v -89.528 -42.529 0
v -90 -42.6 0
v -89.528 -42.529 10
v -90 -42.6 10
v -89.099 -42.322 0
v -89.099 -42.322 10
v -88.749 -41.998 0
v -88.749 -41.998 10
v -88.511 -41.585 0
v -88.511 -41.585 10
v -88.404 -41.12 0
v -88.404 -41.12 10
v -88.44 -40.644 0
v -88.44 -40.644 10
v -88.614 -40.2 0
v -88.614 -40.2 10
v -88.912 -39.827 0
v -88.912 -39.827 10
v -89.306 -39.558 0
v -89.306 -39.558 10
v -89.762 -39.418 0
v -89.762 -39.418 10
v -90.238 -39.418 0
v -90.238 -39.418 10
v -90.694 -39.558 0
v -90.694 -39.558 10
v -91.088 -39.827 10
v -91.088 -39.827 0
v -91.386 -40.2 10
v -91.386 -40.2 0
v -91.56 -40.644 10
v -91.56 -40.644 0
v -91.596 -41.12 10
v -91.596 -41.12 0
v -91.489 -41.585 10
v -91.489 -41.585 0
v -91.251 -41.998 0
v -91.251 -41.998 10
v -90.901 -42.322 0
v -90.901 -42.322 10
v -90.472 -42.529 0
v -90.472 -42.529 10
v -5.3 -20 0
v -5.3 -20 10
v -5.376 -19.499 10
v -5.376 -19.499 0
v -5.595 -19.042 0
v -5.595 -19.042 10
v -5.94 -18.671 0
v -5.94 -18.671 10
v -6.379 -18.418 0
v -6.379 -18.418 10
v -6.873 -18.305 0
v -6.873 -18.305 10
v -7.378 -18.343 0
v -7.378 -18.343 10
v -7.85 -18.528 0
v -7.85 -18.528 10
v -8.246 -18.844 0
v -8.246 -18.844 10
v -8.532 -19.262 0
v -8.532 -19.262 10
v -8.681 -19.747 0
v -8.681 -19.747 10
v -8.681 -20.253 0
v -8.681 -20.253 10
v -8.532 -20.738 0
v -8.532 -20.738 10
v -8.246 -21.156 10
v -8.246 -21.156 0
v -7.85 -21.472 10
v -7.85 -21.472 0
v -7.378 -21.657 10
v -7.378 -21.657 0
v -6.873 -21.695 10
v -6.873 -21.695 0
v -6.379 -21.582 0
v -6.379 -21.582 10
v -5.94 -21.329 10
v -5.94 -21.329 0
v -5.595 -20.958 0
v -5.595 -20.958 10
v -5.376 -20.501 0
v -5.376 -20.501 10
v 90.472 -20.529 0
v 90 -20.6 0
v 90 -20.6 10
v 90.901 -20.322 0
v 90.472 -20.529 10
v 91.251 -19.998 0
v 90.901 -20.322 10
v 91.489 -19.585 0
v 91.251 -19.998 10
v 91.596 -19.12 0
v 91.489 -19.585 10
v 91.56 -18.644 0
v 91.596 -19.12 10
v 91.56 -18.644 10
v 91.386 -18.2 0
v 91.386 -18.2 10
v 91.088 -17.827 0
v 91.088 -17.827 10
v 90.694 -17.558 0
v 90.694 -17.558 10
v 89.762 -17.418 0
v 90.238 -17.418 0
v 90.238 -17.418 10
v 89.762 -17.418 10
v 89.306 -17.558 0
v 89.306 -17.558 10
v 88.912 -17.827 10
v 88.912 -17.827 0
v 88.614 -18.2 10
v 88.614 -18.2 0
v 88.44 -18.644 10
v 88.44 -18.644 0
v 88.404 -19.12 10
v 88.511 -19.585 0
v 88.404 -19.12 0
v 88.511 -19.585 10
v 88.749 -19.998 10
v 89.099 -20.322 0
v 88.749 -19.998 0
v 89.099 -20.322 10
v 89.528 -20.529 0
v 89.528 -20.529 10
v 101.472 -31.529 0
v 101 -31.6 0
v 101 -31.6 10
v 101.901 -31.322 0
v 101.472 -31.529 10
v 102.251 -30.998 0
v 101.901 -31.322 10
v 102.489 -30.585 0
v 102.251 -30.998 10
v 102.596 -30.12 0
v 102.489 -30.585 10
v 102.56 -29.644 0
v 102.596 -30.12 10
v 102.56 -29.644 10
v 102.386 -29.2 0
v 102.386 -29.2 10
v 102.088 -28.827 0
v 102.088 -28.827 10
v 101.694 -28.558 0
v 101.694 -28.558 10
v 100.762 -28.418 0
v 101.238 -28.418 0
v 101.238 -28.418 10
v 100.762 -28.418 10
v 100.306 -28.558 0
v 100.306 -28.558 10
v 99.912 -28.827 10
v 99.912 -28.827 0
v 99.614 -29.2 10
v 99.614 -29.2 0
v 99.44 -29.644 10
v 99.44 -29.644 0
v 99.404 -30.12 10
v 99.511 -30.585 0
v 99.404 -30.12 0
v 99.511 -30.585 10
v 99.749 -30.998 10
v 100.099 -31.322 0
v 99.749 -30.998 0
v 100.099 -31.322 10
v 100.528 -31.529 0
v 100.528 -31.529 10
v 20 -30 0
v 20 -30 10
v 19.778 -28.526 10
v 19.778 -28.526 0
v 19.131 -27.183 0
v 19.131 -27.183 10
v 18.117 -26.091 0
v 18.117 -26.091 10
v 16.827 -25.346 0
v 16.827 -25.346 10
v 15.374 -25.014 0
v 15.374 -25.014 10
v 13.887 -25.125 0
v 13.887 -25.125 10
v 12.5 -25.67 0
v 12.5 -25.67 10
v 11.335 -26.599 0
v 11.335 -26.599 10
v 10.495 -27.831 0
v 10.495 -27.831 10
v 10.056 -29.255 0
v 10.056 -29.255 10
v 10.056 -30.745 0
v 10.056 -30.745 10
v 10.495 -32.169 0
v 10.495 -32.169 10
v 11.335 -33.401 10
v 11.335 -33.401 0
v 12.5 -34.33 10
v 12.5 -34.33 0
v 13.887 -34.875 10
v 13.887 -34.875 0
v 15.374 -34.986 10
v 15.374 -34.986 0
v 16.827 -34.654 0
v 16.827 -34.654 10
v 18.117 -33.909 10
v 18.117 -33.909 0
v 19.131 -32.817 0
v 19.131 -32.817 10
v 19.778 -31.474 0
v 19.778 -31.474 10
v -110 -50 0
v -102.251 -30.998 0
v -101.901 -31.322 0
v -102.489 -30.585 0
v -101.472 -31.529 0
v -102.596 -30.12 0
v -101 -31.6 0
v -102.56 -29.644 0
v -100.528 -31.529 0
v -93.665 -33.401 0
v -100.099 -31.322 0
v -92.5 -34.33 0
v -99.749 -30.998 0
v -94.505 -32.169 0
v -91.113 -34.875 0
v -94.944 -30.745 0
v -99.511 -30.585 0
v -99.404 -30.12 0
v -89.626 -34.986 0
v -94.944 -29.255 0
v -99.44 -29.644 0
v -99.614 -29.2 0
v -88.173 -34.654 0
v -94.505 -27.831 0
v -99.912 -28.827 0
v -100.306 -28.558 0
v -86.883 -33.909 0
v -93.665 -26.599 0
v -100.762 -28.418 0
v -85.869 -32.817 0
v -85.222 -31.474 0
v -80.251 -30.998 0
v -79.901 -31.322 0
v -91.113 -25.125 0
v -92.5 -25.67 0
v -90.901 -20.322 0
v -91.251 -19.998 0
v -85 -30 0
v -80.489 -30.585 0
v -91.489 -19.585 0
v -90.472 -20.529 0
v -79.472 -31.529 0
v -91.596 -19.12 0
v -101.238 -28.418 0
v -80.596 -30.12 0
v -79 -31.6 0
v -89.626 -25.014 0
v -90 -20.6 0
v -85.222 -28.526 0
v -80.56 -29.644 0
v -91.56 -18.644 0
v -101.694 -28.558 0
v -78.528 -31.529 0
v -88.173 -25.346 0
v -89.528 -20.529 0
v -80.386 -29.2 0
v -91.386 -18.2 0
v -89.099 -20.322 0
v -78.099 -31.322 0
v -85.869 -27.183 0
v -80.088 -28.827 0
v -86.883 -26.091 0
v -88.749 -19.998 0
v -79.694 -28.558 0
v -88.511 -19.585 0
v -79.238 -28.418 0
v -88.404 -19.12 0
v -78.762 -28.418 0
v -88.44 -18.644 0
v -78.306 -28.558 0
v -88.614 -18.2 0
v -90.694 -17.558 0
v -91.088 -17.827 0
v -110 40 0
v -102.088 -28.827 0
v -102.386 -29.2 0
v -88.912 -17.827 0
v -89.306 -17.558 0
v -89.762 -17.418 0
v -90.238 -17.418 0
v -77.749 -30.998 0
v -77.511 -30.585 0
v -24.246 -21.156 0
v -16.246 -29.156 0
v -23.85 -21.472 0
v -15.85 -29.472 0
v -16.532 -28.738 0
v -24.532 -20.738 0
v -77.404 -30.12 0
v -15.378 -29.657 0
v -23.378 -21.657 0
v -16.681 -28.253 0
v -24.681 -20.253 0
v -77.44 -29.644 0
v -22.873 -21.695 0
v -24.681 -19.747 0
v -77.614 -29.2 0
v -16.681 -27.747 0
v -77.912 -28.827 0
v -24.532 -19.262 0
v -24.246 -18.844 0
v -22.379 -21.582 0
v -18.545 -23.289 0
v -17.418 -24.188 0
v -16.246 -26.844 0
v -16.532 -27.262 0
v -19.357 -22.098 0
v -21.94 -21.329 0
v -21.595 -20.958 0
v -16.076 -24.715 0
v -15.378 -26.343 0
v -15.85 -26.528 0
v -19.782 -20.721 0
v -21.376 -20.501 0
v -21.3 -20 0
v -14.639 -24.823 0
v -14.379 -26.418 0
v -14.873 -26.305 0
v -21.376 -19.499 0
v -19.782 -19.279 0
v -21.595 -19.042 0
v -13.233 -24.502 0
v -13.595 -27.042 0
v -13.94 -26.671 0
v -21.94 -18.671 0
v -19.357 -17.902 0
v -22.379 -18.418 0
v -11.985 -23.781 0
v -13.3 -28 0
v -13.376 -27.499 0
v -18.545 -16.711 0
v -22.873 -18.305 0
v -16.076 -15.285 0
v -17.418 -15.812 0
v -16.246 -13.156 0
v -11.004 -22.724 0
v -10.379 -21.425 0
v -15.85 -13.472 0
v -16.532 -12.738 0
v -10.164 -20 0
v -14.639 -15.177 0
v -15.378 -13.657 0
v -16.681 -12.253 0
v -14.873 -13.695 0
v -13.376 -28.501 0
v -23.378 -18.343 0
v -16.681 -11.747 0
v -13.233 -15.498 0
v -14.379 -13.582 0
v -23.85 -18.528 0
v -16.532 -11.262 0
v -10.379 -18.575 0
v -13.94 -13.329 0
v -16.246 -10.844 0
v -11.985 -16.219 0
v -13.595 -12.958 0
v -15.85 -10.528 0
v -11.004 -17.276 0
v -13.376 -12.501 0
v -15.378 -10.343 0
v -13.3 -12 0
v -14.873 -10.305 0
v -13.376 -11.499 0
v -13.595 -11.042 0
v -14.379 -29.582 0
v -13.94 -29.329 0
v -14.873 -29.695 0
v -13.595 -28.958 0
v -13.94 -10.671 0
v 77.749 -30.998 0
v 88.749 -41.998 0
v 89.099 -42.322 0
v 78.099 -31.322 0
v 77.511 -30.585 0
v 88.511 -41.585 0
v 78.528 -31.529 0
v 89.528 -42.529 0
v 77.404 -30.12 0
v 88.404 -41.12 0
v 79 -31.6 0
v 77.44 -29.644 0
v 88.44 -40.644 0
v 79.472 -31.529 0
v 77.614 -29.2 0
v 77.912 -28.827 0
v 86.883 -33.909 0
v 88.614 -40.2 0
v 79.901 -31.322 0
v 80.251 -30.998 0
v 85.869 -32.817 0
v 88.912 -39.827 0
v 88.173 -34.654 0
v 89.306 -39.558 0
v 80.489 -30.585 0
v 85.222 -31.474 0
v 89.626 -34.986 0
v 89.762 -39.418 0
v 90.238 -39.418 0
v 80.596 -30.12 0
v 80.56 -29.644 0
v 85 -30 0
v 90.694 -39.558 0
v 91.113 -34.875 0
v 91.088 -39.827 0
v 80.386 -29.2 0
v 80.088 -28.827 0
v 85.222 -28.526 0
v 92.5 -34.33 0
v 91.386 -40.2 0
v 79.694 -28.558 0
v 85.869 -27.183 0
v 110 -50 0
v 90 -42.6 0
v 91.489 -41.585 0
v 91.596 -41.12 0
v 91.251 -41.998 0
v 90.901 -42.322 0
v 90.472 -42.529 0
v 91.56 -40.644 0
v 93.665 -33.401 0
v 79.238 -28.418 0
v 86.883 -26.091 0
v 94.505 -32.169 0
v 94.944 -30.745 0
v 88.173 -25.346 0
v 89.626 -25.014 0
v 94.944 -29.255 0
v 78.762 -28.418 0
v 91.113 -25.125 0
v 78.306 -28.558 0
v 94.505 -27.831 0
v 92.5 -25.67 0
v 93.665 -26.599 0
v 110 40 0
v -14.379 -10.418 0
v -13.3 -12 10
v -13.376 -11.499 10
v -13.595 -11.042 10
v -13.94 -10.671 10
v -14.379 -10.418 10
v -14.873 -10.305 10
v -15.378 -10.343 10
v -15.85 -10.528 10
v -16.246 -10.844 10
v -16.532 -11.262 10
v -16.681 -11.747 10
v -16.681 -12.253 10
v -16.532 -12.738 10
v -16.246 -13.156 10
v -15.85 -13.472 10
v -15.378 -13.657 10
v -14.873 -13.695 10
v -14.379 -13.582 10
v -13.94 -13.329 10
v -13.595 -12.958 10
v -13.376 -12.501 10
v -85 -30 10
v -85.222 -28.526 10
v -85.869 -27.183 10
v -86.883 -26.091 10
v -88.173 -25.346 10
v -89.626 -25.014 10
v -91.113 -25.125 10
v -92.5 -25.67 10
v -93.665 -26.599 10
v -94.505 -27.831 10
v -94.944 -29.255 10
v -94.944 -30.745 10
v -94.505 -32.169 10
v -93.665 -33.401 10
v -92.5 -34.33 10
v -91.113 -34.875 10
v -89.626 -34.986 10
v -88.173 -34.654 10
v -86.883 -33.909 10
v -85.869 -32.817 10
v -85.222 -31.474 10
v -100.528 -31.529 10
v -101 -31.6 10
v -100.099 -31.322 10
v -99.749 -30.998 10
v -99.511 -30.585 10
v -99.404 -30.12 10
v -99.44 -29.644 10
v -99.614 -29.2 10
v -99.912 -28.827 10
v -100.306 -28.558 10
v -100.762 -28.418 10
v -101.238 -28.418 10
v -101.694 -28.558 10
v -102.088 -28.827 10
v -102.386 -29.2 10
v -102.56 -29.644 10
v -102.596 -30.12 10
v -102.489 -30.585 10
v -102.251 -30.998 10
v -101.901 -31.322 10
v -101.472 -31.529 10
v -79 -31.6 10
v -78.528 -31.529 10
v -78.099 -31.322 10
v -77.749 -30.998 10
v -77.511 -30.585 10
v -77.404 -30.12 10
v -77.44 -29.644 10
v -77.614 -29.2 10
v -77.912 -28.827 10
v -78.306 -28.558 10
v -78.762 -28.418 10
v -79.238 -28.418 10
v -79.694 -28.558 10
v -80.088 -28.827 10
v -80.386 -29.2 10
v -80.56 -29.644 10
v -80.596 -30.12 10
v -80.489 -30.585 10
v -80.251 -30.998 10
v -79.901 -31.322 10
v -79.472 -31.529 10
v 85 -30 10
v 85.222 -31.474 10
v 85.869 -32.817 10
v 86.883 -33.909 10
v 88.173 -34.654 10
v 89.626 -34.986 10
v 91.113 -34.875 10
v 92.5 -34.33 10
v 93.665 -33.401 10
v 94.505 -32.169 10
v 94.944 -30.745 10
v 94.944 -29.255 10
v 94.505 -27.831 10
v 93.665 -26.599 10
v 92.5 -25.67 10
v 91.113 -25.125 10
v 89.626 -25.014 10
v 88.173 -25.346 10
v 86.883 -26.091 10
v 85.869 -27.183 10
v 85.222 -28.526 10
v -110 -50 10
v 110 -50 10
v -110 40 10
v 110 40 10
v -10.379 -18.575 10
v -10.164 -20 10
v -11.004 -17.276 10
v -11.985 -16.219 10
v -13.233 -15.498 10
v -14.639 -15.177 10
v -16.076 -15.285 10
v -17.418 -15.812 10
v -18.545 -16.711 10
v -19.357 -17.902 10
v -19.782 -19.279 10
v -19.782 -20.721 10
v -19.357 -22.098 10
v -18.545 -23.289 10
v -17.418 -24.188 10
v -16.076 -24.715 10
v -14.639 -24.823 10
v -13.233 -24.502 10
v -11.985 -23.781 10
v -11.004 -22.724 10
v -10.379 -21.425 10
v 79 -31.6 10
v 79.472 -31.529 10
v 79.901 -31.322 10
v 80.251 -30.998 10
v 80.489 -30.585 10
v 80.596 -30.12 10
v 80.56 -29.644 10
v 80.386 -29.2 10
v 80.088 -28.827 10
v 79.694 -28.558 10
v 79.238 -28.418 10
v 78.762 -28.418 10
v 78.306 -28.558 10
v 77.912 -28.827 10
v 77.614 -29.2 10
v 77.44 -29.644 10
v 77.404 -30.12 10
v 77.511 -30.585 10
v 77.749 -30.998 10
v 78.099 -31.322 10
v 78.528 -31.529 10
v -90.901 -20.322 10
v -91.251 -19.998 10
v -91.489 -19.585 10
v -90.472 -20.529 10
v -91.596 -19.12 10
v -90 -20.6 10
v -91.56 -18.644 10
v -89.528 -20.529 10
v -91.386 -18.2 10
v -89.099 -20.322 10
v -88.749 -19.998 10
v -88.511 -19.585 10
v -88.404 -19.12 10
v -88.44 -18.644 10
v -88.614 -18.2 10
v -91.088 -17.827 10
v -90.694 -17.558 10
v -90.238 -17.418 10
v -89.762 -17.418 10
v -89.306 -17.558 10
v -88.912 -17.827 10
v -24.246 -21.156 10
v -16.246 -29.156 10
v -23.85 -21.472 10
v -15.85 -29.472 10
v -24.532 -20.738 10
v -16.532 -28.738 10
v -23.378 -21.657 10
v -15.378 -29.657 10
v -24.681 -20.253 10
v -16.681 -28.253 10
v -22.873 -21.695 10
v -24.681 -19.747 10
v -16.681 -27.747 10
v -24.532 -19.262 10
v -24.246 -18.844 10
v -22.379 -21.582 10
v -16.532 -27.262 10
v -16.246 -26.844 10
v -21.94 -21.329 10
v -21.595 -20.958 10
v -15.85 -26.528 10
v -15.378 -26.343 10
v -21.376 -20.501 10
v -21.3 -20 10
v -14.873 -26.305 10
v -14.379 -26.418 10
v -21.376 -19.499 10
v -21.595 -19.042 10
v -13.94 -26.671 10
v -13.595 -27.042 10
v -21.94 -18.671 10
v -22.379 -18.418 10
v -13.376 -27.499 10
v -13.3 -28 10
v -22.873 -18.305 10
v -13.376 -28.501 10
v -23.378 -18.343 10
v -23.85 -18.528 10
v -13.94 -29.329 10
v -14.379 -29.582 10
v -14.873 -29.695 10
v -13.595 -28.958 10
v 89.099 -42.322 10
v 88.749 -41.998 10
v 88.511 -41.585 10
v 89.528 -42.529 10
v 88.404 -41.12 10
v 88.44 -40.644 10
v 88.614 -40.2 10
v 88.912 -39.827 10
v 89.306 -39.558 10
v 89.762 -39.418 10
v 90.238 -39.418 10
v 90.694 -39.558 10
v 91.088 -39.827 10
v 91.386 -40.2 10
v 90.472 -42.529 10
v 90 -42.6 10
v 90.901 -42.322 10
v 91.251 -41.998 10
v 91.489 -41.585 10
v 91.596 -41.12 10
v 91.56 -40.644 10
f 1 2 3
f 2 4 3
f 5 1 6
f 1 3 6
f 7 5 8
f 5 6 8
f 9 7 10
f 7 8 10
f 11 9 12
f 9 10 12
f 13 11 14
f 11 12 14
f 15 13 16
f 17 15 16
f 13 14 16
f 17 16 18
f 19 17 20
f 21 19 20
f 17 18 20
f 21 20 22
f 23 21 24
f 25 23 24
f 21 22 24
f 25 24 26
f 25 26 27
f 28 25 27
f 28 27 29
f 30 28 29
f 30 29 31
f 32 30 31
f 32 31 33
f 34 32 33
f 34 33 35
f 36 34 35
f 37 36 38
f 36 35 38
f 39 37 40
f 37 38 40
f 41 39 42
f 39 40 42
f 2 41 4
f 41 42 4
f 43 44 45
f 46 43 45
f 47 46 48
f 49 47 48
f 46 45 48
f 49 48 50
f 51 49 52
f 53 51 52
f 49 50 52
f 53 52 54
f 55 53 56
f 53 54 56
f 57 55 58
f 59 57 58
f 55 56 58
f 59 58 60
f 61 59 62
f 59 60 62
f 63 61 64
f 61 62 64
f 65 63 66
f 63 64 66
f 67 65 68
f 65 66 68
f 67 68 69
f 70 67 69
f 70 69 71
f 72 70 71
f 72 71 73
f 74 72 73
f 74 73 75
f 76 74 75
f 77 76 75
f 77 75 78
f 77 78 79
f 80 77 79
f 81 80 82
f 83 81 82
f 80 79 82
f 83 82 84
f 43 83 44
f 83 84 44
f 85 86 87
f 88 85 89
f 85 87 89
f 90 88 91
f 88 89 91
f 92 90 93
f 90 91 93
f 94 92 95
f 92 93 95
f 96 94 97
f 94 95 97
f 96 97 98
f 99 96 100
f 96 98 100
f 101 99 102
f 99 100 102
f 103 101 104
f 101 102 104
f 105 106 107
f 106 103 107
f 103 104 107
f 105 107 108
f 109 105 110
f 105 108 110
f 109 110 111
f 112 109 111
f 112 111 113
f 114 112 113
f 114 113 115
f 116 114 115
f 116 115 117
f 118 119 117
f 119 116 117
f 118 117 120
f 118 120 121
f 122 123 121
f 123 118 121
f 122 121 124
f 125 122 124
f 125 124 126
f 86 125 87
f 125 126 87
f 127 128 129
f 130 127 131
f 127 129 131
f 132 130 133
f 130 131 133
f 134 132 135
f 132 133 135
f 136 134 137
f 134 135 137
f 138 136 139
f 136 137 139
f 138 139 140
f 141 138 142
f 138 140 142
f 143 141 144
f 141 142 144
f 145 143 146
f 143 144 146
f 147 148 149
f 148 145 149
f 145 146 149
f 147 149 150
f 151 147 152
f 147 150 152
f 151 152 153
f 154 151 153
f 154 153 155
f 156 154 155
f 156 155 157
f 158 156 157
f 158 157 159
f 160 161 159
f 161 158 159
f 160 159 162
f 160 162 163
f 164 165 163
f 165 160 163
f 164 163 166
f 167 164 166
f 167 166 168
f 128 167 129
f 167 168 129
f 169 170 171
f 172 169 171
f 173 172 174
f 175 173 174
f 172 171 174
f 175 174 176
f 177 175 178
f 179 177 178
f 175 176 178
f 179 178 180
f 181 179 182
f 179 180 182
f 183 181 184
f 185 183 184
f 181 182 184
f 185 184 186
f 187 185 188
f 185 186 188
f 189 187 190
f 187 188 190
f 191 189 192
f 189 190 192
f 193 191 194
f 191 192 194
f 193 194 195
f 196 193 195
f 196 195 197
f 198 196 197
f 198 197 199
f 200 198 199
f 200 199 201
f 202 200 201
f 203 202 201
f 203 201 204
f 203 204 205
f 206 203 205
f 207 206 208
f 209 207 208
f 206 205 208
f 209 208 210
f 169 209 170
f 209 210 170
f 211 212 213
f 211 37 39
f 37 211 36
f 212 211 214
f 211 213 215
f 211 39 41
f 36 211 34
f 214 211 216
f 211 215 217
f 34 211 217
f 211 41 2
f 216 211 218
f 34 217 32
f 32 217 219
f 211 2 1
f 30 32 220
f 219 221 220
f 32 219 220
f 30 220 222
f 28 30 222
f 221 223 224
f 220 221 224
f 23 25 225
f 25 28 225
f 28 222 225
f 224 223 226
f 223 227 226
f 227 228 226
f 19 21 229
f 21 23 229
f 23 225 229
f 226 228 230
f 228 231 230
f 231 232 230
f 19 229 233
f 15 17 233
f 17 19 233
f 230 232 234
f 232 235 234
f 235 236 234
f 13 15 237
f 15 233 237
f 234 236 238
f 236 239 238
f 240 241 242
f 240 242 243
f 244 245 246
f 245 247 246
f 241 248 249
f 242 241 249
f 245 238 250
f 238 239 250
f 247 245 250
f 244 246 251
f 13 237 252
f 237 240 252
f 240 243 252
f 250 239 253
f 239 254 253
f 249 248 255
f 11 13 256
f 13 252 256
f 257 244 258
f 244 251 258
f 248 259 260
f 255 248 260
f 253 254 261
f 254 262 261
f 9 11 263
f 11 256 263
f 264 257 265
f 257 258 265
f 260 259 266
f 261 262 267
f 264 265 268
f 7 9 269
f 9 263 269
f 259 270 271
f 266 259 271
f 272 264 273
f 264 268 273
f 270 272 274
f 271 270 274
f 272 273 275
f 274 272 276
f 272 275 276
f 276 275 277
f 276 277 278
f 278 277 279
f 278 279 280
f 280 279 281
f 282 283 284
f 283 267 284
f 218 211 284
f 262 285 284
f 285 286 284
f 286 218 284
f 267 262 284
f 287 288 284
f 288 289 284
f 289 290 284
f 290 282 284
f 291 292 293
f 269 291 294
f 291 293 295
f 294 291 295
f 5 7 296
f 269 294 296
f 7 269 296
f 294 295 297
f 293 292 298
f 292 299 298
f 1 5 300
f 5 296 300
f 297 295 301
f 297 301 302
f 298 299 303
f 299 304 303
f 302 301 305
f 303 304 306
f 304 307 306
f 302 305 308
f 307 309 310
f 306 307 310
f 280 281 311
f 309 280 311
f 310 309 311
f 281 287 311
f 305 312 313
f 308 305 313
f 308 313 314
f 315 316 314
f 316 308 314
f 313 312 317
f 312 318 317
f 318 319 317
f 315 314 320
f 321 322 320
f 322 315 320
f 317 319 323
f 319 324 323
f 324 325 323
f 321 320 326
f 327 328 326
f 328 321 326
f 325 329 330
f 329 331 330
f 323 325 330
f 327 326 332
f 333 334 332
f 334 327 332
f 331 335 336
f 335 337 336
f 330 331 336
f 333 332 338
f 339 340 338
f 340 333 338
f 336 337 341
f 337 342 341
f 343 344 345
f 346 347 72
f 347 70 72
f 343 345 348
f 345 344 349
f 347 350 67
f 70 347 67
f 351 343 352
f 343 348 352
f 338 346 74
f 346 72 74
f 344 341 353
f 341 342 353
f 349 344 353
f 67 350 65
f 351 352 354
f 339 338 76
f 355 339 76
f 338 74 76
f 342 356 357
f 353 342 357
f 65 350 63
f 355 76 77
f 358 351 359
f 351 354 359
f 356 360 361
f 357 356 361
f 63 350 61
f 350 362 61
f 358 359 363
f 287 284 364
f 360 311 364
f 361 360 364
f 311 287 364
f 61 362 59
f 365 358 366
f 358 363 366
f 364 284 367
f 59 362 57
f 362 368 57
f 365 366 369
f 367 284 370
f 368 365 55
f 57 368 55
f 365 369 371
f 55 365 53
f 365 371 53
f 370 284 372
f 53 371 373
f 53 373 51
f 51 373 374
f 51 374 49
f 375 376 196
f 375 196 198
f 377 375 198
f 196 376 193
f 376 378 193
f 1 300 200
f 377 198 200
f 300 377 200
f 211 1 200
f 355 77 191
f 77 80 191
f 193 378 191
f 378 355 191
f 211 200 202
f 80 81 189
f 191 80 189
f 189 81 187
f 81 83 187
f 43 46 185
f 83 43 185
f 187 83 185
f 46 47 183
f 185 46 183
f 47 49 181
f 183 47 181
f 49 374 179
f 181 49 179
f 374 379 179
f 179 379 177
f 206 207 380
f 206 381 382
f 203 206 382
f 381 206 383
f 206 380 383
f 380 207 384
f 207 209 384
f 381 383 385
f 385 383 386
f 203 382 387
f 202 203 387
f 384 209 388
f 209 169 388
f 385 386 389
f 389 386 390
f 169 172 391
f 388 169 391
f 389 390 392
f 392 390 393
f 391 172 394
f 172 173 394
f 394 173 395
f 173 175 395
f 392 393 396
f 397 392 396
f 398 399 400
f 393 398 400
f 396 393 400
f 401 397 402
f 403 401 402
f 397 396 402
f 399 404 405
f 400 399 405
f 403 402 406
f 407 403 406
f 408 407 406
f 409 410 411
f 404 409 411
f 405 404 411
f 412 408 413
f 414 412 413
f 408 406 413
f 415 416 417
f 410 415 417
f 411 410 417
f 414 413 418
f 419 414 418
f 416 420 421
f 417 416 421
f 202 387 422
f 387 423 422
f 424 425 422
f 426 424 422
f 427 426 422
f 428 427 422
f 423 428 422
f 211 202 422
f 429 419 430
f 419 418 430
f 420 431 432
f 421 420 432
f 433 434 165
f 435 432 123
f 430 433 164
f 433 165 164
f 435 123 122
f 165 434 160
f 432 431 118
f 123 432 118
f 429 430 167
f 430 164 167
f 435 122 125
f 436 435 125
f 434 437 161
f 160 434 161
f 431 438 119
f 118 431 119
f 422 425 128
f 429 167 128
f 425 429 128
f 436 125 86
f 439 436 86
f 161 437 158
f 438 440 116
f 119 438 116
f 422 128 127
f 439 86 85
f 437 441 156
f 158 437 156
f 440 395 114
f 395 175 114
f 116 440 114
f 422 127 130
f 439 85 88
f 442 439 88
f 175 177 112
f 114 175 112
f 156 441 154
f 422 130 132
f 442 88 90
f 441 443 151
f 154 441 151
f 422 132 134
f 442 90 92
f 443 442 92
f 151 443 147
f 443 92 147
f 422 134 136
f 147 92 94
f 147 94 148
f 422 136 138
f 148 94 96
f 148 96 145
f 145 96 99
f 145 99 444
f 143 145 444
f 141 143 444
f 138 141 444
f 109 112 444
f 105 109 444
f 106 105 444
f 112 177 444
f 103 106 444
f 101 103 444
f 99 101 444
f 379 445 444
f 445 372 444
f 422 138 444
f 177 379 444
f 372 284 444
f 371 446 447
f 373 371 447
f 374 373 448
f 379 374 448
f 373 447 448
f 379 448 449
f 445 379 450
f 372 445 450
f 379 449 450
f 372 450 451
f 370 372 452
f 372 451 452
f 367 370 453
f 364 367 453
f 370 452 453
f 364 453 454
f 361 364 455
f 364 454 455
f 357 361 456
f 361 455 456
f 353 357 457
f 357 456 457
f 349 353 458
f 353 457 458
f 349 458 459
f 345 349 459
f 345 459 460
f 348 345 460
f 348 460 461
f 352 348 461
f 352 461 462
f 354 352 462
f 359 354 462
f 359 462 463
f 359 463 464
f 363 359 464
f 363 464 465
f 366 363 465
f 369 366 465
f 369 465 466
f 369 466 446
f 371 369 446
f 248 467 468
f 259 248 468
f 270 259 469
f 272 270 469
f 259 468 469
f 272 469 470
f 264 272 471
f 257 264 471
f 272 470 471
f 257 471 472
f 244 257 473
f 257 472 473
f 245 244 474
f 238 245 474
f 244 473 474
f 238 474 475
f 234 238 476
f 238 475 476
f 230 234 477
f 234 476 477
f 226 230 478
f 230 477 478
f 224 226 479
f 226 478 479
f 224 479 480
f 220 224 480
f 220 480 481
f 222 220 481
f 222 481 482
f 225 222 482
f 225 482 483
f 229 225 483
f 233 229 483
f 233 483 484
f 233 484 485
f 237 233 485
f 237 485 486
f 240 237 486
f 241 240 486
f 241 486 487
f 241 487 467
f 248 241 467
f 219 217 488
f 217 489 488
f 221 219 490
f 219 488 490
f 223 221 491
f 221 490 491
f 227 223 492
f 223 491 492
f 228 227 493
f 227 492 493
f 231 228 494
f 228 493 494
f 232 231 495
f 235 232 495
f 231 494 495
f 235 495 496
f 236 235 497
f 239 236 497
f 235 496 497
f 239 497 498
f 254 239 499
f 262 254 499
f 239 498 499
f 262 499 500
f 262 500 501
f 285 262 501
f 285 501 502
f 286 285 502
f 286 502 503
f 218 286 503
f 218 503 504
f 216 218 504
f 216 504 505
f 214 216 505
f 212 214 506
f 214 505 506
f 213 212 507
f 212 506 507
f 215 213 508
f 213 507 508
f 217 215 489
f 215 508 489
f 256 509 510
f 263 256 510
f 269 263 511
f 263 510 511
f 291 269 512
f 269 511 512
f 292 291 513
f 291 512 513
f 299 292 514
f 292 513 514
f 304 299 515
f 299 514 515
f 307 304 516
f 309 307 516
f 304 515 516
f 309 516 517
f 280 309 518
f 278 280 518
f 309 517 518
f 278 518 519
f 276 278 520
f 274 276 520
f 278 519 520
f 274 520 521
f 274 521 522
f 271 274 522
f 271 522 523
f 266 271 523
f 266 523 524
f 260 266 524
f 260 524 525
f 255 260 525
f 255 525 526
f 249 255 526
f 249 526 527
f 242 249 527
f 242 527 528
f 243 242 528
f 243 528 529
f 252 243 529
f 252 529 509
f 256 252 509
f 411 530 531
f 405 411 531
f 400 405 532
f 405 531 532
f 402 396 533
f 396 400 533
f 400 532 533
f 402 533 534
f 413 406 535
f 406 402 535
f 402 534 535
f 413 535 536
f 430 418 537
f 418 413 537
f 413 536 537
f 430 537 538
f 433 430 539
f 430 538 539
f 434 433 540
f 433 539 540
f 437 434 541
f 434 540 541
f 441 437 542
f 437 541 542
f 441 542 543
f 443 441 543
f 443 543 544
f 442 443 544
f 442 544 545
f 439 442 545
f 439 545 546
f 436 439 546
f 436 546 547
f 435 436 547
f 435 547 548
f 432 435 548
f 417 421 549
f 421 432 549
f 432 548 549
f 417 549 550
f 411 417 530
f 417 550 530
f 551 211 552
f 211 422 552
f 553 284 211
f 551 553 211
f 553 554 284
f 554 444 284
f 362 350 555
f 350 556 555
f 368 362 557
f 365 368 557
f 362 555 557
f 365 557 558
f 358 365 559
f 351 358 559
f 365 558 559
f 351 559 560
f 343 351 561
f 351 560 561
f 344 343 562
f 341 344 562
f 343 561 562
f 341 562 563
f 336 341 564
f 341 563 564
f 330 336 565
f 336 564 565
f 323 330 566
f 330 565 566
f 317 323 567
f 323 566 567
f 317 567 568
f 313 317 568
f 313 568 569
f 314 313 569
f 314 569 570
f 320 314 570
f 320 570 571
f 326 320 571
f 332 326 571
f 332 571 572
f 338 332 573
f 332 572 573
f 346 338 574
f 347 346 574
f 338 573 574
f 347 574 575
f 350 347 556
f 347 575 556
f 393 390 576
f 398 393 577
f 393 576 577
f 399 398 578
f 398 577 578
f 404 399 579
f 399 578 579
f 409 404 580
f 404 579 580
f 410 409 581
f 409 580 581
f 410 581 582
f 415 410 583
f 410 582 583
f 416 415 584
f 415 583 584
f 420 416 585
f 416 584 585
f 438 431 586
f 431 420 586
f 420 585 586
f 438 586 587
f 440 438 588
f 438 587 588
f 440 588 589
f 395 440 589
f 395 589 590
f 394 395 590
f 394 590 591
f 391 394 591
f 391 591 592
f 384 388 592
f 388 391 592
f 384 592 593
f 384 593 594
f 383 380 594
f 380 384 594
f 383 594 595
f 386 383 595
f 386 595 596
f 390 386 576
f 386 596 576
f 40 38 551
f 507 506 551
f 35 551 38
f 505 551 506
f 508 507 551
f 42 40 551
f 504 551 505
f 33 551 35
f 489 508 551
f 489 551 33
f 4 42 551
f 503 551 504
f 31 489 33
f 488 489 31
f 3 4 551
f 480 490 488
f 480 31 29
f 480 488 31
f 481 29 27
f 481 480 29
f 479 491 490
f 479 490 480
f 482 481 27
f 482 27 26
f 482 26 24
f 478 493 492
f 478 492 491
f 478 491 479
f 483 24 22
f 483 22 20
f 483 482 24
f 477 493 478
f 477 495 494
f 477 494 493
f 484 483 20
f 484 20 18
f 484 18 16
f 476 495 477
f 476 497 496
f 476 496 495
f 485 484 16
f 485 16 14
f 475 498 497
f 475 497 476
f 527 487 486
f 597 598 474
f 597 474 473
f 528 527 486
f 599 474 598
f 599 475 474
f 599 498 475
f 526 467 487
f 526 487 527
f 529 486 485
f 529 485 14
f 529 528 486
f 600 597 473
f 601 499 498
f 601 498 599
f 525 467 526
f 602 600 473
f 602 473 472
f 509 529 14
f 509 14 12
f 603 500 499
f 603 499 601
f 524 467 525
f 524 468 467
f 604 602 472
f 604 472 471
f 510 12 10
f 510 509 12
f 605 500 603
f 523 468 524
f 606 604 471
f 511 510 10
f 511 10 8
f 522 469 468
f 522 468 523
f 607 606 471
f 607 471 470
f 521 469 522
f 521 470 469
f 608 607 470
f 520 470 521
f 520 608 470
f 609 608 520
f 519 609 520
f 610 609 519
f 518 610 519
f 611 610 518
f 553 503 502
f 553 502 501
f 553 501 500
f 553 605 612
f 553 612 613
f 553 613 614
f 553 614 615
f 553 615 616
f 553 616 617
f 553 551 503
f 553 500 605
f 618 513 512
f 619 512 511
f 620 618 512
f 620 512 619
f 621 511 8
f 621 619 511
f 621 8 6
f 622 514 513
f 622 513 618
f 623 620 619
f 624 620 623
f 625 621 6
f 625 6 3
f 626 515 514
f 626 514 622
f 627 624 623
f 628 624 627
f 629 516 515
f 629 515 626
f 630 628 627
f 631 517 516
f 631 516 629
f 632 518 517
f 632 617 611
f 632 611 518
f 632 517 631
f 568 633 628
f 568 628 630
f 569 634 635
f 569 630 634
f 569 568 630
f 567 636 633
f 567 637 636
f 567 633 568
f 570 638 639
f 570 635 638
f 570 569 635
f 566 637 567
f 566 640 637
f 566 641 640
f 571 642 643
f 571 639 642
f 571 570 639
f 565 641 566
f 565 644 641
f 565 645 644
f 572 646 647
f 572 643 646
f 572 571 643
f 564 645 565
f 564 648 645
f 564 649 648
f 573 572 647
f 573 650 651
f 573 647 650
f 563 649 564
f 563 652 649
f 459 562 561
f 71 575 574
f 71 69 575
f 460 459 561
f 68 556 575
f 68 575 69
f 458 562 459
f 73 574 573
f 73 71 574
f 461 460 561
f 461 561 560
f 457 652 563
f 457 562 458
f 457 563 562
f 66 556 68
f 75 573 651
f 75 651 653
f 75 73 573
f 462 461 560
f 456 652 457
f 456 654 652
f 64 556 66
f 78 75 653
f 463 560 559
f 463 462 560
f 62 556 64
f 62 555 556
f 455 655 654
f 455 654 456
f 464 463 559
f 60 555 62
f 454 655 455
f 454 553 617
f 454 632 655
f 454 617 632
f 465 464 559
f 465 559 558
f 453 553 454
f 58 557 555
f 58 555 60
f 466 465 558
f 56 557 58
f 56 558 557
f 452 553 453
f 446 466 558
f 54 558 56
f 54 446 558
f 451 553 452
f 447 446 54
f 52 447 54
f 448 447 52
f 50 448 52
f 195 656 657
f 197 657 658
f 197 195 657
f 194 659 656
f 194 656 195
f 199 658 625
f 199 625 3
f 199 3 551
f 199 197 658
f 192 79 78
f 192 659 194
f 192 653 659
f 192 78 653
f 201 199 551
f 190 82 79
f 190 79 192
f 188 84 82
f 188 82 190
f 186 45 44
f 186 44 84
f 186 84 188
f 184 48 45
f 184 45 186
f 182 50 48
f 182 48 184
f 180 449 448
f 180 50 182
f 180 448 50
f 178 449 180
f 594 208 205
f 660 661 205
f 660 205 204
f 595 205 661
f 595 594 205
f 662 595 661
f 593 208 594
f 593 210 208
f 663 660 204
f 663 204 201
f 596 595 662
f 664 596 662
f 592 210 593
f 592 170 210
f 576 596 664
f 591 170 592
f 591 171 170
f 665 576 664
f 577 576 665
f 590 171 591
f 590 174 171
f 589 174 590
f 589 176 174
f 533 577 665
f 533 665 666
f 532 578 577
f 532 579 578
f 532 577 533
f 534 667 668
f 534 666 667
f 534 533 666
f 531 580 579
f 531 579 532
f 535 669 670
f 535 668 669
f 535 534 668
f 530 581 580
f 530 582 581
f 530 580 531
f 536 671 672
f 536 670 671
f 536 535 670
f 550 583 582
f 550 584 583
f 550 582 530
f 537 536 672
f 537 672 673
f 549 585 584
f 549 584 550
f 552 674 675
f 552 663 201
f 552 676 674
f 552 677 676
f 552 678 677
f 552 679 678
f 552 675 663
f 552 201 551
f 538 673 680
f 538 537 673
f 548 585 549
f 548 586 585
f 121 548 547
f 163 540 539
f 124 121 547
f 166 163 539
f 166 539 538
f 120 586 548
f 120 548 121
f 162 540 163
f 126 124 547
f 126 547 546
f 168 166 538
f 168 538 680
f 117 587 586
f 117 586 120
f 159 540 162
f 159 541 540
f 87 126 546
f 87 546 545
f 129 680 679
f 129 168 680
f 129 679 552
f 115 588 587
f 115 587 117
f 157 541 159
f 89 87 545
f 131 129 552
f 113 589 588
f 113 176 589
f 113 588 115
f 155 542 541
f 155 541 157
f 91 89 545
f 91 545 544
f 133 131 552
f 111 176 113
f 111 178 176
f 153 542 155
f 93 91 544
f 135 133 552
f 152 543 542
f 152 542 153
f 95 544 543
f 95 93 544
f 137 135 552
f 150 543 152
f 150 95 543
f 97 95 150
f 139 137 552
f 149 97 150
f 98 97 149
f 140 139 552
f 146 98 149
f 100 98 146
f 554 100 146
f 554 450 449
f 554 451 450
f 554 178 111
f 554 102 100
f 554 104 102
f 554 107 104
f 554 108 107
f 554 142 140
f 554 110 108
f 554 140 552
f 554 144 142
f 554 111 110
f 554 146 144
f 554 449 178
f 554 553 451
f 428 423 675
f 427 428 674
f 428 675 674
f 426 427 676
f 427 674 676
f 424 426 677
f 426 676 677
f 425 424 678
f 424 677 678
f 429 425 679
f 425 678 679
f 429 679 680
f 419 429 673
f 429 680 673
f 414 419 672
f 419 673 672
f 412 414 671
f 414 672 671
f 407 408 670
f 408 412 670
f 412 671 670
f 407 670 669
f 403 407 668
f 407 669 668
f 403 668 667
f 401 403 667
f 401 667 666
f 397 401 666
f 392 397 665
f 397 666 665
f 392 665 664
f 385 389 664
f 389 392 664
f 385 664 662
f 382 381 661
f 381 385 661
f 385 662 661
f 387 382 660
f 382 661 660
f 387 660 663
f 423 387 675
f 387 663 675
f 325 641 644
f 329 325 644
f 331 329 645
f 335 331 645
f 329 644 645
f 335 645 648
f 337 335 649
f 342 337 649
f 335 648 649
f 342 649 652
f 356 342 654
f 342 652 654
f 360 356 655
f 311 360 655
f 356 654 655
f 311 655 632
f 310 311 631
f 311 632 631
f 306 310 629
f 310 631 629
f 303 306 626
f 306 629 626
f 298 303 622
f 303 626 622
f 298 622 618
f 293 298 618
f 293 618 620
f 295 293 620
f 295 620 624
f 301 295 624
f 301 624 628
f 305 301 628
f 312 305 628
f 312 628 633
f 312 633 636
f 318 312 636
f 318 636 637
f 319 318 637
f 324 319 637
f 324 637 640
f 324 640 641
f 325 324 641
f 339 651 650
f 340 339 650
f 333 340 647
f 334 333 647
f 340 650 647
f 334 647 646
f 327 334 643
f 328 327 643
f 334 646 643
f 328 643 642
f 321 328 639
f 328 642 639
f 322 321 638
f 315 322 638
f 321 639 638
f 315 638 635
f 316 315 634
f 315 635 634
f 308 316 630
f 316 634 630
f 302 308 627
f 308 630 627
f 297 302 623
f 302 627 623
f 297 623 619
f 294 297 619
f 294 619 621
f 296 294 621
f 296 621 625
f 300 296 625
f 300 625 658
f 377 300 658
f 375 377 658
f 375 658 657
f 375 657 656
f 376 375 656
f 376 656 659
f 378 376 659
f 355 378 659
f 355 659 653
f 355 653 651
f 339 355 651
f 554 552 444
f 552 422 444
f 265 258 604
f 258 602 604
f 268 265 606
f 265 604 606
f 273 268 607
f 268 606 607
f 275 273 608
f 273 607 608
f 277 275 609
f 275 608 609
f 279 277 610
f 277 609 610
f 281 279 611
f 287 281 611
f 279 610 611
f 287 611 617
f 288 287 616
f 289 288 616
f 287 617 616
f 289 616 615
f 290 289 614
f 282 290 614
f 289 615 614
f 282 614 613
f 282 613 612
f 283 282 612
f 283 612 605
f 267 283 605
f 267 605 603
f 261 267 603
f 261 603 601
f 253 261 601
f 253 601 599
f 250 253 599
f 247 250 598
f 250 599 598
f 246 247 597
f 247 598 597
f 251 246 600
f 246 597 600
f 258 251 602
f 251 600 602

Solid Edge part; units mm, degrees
sketch "Sketch1" plane through (0, 0, 0) normal (0, 0, 1) x (1, 0, 0)
  line L0 (-110, -40) -> (110, -40)
  line L1 (110, -40) -> (110, 40)
  line L2 (110, 40) -> (-110, 40)
  line L3 (-110, 40) -> (-110, -40)
  dimension "D1" = 220
  dimension "D2" = 80
extrude "Protrusion1" add sketch "Sketch1" along normal blind 10
sketch "Sketch2" plane through (0, -40, 5) normal (0, -1, 0) x (1, 0, 0)
  line L0 (-110, 5) -> (110, 5)
  line L1 (110, 5) -> (110, -5)
  line L2 (110, -5) -> (-110, -5)
  line L3 (-110, -5) -> (-110, 5)
extrude "Extrusionsausprägung_2" add sketch "Sketch2" along normal blind 10
sketch "Sketch3" plane through (0, -5, 10) normal (0, 0, 1) x (1, 0, 0)
  circle A0 centre (-90, -25) radius 5
  dimension "D1" = 90
  dimension "D2" = 20
  dimension "D3" = 10
extrude "Cutout1" cut sketch "Sketch3" against normal up to next
hole "Bohrung_2" at (-90, -19, 10) direction (0, 0, -1) diameter 3.2 end up to next
hole "Hole1" at (-101, -30, 10) direction (0, 0, -1) diameter 3.2 end up to next
hole "Hole2" at (-90, -41, 10) direction (0, 0, -1) diameter 3.2 end up to next
hole "Hole3" at (-79, -30, 10) direction (0, 0, -1) diameter 3.2 end up to next
mirror "Mirror1" about plane through (0, 0, 0) normal (1, 0, 0) of "Cutout1", "Bohrung_2", "Hole1", "Hole2", "Hole3"
sketch "Sketch4" plane through (0, -5, 10) normal (0, 0, 1) x (1, 0, 0)
  circle A0 centre (15, -25) radius 5
  dimension "D1" = 75
  dimension "D2" = 10
extrude "Cutout2" cut sketch "Sketch4" against normal up to next
sketch "Sketch5" plane through (0, -5, 10) normal (0, 0, 1) x (1, 0, 0)
  circle A0 centre (-15, -15) radius 4.8361
  circle A1 centre (-15, -7) radius 1.7
  circle A2 centre (-7, -15) radius 1.7
  circle A3 centre (-15, -23) radius 1.7
  circle A4 centre (-23, -15) radius 1.7
  dimension "D1" = 10
  dimension "D2" = 30
  dimension "D3" = 16
  dimension "D4" = 3.4
extrude "Cutout3" cut sketch "Sketch5" against normal up to next
properties material "Nylon, allgemein"
